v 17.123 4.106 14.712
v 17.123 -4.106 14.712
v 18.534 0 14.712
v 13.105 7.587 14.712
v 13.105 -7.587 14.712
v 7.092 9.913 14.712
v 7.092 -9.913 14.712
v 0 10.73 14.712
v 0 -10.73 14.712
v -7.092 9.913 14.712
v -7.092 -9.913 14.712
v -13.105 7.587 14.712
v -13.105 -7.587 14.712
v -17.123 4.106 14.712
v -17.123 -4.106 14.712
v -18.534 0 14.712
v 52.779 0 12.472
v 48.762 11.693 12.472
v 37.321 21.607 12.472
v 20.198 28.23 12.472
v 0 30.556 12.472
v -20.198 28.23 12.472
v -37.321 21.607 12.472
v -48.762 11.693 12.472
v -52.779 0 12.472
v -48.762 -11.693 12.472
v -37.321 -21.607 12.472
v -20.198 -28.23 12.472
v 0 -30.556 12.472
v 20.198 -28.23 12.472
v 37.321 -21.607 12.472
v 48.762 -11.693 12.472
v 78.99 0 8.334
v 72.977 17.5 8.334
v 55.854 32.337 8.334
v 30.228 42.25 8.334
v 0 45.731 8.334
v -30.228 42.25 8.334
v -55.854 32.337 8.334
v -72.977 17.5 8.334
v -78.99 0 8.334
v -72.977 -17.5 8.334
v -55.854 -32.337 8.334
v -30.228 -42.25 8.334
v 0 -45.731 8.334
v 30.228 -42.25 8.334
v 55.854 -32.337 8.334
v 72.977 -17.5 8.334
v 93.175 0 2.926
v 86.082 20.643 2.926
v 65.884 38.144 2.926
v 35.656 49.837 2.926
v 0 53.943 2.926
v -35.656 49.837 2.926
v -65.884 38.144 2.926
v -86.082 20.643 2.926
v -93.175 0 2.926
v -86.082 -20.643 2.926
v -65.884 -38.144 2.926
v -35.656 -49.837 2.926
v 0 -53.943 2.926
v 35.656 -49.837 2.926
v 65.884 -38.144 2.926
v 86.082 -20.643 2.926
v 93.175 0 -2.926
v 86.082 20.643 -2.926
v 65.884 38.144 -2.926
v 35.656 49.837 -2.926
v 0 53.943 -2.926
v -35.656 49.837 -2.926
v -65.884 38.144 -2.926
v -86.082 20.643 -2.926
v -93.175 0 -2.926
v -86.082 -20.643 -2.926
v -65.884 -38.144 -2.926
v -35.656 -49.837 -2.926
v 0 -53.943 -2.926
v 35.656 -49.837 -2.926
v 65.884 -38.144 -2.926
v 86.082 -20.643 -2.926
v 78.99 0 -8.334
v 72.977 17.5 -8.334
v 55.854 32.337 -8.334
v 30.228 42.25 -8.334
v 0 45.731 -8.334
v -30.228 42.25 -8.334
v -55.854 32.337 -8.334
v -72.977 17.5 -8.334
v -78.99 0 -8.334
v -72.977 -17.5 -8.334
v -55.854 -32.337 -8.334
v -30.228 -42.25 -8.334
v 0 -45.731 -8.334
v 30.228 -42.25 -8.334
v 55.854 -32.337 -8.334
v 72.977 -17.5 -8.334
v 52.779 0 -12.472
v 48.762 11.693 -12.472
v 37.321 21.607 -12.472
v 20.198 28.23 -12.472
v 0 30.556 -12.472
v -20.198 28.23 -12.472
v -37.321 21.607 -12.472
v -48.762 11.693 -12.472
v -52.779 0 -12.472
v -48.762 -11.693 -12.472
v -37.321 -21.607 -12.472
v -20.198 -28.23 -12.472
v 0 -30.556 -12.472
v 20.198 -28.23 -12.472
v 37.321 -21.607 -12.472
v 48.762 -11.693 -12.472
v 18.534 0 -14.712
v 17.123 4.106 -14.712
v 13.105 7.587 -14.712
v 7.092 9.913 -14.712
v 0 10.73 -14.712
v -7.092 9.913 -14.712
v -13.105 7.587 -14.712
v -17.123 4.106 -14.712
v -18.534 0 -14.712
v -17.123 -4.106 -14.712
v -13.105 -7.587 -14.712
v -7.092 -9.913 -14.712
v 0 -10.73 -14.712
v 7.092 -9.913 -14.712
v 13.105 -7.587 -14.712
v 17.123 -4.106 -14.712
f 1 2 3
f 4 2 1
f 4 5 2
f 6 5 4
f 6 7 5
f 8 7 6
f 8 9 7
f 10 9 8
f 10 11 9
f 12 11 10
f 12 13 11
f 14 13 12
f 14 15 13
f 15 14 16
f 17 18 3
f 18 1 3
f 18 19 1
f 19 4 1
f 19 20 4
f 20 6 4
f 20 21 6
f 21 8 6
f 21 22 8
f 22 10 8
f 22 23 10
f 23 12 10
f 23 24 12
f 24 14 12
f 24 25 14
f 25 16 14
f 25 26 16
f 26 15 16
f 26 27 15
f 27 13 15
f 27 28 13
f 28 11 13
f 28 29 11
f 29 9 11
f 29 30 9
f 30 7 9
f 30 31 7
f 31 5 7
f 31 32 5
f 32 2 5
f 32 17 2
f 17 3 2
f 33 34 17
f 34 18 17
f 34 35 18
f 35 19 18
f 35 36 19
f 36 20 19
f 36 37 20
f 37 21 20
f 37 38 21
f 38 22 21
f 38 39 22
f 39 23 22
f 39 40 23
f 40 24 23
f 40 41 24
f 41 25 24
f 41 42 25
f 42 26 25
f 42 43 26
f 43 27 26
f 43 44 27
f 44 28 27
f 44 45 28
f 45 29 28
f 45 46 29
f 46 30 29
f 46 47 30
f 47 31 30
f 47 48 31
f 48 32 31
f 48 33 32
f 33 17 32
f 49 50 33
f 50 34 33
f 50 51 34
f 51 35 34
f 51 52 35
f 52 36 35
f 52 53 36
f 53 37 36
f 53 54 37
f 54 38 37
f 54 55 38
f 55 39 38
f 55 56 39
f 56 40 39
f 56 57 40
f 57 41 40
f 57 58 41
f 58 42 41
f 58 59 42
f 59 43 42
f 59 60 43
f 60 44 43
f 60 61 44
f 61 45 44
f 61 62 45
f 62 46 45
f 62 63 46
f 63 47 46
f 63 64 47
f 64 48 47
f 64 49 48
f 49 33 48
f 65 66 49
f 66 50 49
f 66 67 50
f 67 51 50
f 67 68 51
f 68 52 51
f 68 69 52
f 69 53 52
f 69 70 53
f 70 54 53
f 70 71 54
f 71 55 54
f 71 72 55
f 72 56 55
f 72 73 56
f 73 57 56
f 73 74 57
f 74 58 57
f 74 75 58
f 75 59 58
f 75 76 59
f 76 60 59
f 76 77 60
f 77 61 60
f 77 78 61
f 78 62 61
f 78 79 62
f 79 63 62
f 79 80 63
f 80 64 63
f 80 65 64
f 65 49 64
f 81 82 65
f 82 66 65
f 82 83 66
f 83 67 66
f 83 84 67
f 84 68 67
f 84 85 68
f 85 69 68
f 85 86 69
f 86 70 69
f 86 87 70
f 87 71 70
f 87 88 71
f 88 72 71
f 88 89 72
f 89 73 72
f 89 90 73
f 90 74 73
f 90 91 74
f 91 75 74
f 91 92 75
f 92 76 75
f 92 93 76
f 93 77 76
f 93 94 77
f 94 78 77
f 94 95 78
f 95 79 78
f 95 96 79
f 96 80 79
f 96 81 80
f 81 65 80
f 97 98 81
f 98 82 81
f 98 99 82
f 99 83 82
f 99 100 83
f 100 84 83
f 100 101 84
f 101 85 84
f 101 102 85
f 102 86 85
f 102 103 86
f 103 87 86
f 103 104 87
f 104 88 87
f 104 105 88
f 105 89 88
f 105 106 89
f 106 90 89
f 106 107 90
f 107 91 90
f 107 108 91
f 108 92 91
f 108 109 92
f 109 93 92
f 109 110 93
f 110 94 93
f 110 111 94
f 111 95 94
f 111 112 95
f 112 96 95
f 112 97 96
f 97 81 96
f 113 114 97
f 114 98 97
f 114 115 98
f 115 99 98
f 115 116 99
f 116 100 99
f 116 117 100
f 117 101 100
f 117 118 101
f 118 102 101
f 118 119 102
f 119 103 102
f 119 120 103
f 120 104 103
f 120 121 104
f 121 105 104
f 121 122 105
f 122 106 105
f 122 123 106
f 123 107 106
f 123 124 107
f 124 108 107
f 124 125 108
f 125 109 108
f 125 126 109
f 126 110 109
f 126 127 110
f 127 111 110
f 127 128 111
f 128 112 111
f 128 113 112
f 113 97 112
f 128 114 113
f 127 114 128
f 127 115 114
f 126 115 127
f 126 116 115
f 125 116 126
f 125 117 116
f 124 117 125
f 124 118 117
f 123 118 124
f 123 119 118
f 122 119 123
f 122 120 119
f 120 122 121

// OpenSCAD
// Generated by SolidPython 1.0.1 on 2020-07-29 00:46:54


scale(v = [19, 11, 3]) {
	sphere(r = 5);
}
/***********************************************
*********      SolidPython code:      **********
************************************************
 
# import packages: SolidPython
from solid import *
from solid.utils import *
from itertools import chain, combinations, permutations


class Resize:

    def __init__(self, scad_file):
        self.scad_file = scad_file
        #self.scad_file = import_scad(scad_file)
        # cone/cylinder param:
        self.r1 = 0
        self.r2 = 0
        self.h = 0
        # rectangular prism param:
        self.w = 0
        self.l = 0
        # ellipse param:
        self.r = 0

    # import OpenScad code (file name corresponds to shape)


    # classify shape + parameters
    def assign(self, param1, param2, param3):
        if self.scad_file == 'cone.scad':
            self.r1 = param1
            self.r2 = param2
            self.h = param3
        elif self.scad_file == 'cylinder.scad':
            self.r1 = param1
            self.r2 = param2
            self.h = param3
        elif self.scad_file == 'rectangularPrism.scad':
            self.h = param1
            self.l = param2
            self.w = param3
        else:
            self.r = param1
            self.h = param2

    # resize parameters
    def iterate(self):
        x = range(3, 20, 2)
        i = 1
        if self.scad_file == 'cone.scad':
            tempList = list(permutations(x, 2))
            for temp in tempList:
                param1 = temp[0]
                param2 = temp[1]
                filepath = 'produced_scad_files/' + 'cone' + str(param1) + '_' + str(param2) + '_' + '.scad'
                scad_render_to_file(cylinder(h=param1, r1=param2, r2=0), filepath)

        elif self.scad_file == 'cylinder.scad':
            tempList = list(permutations(x, 3))
            for temp in tempList:
                param1 = temp[0]
                param2 = temp[1]
                filepath = 'produced_scad_files/' + 'cylinder' + str(param1) + '_' + str(param2) + '_' + '.scad'
                scad_render_to_file(cylinder(h=param1, r1=param2, r2=param2), filepath)

        elif self.scad_file == 'rectangularPrism.scad':
            tempList = list(permutations(x, 3))
            for temp in tempList:
                param1 = temp[0]
                param2 = temp[1]
                param3 = temp[2]
                filepath = 'produced_scad_files/' + 'rectangularPrism' + str(param1) + '_' + str(param2) + '_' + str(
                    param3) + '.scad'
                scad_render_to_file(cube(size=(param1, param2, param3)), filepath)

        elif self.scad_file == 'ellipse.scad':
            tempList = list(permutations(x, 4))
            for temp in tempList:
                param1 = temp[0]
                param2 = temp[1]
                param3 = temp[2]
                param4 = temp[3]
                filepath = 'produced_scad_files/' + 'ellipse' + str(param1) + '_' + str(param2) + '_' + str(param3) + '_' + str(param4) + '.scad'
                scad_render_to_file(scale([param1, param2, param3])(sphere(r=param4)), filepath)

    def render_to_scadfile(self):
        scad_render_to_file(scad, 'example.scad') 
 
************************************************/
